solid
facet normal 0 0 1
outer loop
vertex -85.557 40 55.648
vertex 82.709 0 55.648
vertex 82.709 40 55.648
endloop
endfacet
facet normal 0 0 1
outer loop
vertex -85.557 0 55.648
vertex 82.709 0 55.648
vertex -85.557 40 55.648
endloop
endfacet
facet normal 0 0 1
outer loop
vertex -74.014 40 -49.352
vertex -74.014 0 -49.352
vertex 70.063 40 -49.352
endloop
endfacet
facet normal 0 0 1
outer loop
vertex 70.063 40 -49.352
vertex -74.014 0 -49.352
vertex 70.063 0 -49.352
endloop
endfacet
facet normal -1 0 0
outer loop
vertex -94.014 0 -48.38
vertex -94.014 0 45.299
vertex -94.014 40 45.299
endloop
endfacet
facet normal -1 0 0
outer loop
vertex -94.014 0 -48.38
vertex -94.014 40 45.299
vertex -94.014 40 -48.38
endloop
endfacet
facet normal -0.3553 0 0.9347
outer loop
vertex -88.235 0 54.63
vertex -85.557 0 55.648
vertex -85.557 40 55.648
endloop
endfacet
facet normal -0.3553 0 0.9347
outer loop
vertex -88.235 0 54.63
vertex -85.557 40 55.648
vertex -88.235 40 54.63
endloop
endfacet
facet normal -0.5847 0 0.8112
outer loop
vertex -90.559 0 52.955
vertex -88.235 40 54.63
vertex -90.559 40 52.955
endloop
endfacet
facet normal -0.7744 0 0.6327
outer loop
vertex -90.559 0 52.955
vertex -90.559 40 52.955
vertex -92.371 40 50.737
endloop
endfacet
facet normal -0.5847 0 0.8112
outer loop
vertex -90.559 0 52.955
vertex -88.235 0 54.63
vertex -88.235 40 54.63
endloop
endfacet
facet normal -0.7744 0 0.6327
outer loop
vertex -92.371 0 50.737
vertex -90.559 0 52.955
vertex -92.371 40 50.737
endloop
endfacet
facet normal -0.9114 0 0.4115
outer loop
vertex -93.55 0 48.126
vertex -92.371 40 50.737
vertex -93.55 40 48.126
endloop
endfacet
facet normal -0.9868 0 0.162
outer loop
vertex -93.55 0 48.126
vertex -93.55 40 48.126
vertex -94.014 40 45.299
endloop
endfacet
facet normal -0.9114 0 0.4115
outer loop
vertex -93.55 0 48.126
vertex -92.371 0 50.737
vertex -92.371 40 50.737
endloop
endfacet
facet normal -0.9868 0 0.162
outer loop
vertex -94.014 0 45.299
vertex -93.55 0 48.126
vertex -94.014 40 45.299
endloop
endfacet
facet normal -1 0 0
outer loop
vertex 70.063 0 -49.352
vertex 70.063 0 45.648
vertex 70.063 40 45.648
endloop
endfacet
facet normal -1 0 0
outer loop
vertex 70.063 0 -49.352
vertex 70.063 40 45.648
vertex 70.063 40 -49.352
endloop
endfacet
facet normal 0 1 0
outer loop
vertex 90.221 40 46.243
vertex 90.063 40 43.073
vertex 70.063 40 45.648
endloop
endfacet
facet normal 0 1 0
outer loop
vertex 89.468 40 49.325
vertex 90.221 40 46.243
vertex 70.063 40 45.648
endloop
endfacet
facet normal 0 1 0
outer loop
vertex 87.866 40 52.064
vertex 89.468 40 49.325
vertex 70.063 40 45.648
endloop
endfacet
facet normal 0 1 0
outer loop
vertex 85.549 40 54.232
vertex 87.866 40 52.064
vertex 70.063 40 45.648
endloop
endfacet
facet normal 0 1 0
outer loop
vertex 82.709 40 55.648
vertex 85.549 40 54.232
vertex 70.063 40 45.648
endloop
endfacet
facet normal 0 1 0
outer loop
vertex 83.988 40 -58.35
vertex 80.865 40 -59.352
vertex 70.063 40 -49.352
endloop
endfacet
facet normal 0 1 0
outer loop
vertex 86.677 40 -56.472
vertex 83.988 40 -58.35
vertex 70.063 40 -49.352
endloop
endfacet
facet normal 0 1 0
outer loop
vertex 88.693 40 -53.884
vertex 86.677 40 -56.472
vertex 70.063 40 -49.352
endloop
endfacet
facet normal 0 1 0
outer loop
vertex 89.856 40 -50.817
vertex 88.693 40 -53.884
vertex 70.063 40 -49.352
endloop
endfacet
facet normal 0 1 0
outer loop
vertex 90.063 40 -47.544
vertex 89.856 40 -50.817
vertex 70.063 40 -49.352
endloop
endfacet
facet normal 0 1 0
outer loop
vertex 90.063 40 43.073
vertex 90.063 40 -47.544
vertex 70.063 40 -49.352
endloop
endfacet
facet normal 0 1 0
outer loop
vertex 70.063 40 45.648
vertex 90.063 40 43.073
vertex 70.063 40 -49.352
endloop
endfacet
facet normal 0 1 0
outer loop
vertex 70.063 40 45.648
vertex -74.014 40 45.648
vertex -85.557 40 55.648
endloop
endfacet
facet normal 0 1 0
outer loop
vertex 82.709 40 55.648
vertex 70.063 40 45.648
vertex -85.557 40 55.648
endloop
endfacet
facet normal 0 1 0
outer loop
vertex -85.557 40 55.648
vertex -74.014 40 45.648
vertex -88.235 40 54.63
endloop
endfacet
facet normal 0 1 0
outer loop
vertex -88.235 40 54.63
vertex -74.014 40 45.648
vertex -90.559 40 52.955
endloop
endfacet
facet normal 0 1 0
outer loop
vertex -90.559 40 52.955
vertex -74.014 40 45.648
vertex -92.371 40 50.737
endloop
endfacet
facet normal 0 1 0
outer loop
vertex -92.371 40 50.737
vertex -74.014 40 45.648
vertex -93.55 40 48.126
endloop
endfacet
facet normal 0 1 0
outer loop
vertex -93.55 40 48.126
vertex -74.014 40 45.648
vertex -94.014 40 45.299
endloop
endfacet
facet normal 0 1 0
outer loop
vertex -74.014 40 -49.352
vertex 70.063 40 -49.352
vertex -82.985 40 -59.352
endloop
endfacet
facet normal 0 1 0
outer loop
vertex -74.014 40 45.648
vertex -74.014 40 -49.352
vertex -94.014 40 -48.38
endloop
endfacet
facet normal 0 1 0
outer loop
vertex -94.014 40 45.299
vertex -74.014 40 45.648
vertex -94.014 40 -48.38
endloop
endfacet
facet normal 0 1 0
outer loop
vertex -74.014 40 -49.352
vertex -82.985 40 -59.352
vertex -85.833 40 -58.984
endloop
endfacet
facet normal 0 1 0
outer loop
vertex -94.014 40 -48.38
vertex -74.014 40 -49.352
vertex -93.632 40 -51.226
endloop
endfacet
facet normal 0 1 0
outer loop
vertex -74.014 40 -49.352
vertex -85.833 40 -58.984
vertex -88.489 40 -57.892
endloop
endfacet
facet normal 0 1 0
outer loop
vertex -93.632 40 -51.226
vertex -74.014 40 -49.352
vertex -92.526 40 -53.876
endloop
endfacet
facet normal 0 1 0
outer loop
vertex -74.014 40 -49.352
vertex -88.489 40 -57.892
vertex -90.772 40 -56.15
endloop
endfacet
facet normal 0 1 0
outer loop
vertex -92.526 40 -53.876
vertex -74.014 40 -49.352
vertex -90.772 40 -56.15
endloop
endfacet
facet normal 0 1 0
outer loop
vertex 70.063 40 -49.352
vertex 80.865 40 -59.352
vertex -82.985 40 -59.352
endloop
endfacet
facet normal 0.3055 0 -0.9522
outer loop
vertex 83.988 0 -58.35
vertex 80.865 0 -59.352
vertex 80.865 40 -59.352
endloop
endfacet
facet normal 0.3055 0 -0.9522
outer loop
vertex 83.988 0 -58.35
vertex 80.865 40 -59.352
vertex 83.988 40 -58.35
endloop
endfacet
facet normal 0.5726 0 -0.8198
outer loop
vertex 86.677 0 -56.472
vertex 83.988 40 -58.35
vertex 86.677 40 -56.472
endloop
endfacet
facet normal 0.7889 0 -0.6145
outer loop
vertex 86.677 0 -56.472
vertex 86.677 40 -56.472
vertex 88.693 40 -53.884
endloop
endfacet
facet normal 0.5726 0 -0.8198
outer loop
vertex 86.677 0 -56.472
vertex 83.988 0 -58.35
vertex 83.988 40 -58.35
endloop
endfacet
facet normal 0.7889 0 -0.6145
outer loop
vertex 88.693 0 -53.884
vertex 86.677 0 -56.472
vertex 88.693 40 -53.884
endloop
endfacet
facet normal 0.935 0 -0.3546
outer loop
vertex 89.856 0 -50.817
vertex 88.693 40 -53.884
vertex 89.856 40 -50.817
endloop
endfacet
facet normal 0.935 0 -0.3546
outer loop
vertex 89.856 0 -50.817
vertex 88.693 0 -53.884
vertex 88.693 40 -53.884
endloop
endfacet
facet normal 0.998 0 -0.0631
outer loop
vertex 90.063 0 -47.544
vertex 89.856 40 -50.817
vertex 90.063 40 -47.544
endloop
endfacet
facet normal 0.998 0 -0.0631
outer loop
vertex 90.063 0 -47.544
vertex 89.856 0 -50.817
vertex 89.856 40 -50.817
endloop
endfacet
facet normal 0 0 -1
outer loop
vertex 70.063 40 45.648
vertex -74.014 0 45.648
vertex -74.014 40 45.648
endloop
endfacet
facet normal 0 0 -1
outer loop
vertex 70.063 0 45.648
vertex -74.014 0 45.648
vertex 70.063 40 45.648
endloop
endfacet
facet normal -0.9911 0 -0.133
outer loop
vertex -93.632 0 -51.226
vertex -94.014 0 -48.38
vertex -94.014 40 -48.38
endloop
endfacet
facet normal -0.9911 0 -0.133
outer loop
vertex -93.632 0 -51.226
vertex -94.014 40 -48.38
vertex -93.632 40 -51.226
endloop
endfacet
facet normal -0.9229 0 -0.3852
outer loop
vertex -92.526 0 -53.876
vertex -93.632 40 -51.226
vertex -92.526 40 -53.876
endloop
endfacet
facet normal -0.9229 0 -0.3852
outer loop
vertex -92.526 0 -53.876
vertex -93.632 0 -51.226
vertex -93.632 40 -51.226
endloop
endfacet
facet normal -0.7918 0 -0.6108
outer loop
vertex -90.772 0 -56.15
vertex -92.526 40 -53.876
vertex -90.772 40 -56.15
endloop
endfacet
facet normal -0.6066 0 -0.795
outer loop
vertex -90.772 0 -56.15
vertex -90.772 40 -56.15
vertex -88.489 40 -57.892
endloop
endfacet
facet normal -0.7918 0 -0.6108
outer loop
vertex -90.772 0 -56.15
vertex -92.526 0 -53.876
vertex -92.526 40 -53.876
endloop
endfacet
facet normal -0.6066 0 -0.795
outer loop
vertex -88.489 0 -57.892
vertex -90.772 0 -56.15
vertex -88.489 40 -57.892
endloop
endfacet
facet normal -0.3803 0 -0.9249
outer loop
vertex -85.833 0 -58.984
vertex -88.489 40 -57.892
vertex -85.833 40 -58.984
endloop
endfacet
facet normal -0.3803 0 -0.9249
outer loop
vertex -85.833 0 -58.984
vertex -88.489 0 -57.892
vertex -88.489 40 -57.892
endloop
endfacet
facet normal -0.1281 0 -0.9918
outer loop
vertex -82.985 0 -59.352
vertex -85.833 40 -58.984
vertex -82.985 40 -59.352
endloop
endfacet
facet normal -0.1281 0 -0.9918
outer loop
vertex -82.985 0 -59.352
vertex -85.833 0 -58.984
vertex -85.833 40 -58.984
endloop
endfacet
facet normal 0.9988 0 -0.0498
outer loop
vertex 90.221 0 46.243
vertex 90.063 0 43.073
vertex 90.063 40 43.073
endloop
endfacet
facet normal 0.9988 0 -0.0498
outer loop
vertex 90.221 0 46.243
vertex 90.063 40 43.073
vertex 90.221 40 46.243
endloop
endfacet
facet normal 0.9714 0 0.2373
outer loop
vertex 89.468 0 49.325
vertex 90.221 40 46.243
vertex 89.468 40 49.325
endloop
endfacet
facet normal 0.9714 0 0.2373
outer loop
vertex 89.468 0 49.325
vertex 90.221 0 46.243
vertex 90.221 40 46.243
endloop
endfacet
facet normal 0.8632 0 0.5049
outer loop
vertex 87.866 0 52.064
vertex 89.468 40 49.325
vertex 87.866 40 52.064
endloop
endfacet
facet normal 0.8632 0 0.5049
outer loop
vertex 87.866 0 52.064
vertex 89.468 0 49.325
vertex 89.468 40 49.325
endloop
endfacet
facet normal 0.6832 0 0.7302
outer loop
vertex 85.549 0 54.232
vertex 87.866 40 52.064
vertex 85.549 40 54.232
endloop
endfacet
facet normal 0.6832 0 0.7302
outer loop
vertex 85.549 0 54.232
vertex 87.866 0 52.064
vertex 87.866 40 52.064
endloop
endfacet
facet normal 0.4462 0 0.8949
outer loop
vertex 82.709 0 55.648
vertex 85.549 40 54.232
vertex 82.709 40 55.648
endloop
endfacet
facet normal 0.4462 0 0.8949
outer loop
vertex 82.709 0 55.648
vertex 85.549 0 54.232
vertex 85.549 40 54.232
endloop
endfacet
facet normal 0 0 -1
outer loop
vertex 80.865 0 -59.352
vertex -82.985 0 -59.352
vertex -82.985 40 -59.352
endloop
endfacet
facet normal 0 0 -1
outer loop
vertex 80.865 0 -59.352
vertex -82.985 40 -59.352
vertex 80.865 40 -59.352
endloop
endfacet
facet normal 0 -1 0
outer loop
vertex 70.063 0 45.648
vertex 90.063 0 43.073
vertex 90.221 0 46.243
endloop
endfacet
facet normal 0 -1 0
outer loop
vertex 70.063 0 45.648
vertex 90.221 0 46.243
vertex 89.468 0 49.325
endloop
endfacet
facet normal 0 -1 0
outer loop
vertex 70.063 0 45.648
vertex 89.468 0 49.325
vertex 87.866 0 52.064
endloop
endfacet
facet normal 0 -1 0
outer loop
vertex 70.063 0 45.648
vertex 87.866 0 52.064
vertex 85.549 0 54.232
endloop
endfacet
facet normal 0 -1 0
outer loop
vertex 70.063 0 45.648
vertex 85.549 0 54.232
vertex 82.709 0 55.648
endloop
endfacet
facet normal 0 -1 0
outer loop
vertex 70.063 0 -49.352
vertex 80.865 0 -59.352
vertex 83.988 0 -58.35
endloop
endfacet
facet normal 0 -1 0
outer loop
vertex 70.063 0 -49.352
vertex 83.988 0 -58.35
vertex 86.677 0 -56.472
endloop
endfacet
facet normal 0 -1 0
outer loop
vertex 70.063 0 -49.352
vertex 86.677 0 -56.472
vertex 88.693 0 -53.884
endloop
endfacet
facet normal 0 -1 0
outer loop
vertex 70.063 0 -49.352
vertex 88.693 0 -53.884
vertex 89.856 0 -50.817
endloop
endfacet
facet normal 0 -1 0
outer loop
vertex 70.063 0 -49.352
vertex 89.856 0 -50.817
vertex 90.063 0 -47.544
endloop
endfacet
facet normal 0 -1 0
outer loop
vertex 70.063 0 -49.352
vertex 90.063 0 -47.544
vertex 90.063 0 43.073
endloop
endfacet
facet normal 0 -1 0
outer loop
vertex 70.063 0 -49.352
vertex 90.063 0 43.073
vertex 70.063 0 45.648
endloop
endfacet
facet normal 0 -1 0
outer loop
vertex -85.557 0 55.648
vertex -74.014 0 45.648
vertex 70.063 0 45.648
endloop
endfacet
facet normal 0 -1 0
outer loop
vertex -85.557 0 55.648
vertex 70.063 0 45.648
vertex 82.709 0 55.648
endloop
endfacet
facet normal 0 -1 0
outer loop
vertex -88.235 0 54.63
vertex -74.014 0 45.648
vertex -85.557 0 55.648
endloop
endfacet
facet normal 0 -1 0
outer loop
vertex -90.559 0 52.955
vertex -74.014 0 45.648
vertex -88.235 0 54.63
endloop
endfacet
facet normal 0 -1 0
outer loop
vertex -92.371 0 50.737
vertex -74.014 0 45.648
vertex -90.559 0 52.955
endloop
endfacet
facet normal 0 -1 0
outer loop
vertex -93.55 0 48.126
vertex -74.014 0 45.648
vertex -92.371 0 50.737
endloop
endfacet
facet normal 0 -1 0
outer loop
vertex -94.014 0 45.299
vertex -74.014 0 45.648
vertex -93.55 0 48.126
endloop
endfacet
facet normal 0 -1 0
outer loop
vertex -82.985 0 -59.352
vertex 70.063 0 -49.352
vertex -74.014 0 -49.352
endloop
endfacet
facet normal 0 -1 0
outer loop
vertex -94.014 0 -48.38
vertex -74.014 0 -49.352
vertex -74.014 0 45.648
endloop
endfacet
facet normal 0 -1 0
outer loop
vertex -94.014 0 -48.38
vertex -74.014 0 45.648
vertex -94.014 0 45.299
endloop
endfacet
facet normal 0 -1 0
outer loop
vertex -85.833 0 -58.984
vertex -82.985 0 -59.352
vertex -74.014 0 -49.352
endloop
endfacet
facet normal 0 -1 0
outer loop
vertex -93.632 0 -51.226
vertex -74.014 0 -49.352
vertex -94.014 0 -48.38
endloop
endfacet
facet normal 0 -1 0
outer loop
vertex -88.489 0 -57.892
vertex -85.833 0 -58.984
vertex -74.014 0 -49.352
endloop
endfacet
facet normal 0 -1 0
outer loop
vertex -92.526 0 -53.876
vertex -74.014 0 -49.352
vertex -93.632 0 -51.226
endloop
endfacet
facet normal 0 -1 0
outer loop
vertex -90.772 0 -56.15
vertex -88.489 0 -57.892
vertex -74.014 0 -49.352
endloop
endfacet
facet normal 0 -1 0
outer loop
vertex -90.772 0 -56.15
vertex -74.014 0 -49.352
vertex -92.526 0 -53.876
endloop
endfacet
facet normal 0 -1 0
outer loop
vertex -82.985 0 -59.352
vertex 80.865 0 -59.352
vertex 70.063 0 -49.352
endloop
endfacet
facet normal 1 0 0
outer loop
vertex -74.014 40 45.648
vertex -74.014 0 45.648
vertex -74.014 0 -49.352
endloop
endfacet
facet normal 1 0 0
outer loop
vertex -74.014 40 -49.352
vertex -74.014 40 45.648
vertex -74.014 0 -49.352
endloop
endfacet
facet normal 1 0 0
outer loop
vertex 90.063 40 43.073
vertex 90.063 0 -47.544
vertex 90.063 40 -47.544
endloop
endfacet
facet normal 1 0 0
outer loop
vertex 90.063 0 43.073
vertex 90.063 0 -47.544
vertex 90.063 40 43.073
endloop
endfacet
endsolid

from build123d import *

# Parameters (mm, degrees)
SKETCH1_W           = 144.077216911
SKETCH1_H           = 95
BOSS_EXTRUDE1_DEPTH = 40
SKETCH1_2_W         = 144.077216911
SKETCH1_2_H         = 95
BOSS_EXTRUDE2_DEPTH = 40


with BuildPart() as part:
    # Sketch1 → Boss-Extrude1 (new body)
    with BuildSketch(Plane(origin=(0, 0, 0), x_dir=(1, 0, 0), z_dir=(0, 1, 0))):
        with BuildLine():
            Line((82.709021157, -55.64828922), (-85.557066869, -55.64828922))
            ThreePointArc((-85.557066869, -55.64828922), (-91.537525449, -51.905150215), (-94.013859445, -45.298733306))
            Line((-94.013859445, -45.298733306), (-94.013859445, 48.380180377))
            ThreePointArc((-94.013859445, 48.380180377), (-90.771939739, 56.150001197), (-82.985463341, 59.35171078))
            Line((-82.985463341, 59.35171078), (80.864804877, 59.35171078))
            ThreePointArc((80.864804877, 59.35171078), (87.782044869, 55.253574592), (90.063357466, 47.543935031))
            Line((90.063357466, 47.543935031), (90.063357466, -43.073295521))
            ThreePointArc((90.063357466, -43.073295521), (88.766131999, -50.752673698), (82.709021157, -55.64828922))
        make_face()
        with Locations((-1.97525099, 1.85171078)):
            Rectangle(SKETCH1_W, SKETCH1_H, mode=Mode.SUBTRACT)
    extrude(amount=BOSS_EXTRUDE1_DEPTH)

    # Sketch1<2> → Boss-Extrude2 (add)
    with BuildSketch(Plane(origin=(0, 0, 0), x_dir=(1, 0, 0), z_dir=(0, 1, 0))):
        with BuildLine():
            Line((82.709021157, -55.64828922), (-85.557066869, -55.64828922))
            ThreePointArc((-85.557066869, -55.64828922), (-91.537525449, -51.905150215), (-94.013859445, -45.298733306))
            Line((-94.013859445, -45.298733306), (-94.013859445, 48.380180377))
            ThreePointArc((-94.013859445, 48.380180377), (-90.771939739, 56.150001197), (-82.985463341, 59.35171078))
            Line((-82.985463341, 59.35171078), (80.864804877, 59.35171078))
            ThreePointArc((80.864804877, 59.35171078), (87.782044869, 55.253574592), (90.063357466, 47.543935031))
            Line((90.063357466, 47.543935031), (90.063357466, -43.073295521))
            ThreePointArc((90.063357466, -43.073295521), (88.766131999, -50.752673698), (82.709021157, -55.64828922))
        make_face()
        with Locations((-1.97525099, 1.85171078)):
            Rectangle(SKETCH1_2_W, SKETCH1_2_H, mode=Mode.SUBTRACT)
    extrude(amount=BOSS_EXTRUDE2_DEPTH)


solid = part.part
